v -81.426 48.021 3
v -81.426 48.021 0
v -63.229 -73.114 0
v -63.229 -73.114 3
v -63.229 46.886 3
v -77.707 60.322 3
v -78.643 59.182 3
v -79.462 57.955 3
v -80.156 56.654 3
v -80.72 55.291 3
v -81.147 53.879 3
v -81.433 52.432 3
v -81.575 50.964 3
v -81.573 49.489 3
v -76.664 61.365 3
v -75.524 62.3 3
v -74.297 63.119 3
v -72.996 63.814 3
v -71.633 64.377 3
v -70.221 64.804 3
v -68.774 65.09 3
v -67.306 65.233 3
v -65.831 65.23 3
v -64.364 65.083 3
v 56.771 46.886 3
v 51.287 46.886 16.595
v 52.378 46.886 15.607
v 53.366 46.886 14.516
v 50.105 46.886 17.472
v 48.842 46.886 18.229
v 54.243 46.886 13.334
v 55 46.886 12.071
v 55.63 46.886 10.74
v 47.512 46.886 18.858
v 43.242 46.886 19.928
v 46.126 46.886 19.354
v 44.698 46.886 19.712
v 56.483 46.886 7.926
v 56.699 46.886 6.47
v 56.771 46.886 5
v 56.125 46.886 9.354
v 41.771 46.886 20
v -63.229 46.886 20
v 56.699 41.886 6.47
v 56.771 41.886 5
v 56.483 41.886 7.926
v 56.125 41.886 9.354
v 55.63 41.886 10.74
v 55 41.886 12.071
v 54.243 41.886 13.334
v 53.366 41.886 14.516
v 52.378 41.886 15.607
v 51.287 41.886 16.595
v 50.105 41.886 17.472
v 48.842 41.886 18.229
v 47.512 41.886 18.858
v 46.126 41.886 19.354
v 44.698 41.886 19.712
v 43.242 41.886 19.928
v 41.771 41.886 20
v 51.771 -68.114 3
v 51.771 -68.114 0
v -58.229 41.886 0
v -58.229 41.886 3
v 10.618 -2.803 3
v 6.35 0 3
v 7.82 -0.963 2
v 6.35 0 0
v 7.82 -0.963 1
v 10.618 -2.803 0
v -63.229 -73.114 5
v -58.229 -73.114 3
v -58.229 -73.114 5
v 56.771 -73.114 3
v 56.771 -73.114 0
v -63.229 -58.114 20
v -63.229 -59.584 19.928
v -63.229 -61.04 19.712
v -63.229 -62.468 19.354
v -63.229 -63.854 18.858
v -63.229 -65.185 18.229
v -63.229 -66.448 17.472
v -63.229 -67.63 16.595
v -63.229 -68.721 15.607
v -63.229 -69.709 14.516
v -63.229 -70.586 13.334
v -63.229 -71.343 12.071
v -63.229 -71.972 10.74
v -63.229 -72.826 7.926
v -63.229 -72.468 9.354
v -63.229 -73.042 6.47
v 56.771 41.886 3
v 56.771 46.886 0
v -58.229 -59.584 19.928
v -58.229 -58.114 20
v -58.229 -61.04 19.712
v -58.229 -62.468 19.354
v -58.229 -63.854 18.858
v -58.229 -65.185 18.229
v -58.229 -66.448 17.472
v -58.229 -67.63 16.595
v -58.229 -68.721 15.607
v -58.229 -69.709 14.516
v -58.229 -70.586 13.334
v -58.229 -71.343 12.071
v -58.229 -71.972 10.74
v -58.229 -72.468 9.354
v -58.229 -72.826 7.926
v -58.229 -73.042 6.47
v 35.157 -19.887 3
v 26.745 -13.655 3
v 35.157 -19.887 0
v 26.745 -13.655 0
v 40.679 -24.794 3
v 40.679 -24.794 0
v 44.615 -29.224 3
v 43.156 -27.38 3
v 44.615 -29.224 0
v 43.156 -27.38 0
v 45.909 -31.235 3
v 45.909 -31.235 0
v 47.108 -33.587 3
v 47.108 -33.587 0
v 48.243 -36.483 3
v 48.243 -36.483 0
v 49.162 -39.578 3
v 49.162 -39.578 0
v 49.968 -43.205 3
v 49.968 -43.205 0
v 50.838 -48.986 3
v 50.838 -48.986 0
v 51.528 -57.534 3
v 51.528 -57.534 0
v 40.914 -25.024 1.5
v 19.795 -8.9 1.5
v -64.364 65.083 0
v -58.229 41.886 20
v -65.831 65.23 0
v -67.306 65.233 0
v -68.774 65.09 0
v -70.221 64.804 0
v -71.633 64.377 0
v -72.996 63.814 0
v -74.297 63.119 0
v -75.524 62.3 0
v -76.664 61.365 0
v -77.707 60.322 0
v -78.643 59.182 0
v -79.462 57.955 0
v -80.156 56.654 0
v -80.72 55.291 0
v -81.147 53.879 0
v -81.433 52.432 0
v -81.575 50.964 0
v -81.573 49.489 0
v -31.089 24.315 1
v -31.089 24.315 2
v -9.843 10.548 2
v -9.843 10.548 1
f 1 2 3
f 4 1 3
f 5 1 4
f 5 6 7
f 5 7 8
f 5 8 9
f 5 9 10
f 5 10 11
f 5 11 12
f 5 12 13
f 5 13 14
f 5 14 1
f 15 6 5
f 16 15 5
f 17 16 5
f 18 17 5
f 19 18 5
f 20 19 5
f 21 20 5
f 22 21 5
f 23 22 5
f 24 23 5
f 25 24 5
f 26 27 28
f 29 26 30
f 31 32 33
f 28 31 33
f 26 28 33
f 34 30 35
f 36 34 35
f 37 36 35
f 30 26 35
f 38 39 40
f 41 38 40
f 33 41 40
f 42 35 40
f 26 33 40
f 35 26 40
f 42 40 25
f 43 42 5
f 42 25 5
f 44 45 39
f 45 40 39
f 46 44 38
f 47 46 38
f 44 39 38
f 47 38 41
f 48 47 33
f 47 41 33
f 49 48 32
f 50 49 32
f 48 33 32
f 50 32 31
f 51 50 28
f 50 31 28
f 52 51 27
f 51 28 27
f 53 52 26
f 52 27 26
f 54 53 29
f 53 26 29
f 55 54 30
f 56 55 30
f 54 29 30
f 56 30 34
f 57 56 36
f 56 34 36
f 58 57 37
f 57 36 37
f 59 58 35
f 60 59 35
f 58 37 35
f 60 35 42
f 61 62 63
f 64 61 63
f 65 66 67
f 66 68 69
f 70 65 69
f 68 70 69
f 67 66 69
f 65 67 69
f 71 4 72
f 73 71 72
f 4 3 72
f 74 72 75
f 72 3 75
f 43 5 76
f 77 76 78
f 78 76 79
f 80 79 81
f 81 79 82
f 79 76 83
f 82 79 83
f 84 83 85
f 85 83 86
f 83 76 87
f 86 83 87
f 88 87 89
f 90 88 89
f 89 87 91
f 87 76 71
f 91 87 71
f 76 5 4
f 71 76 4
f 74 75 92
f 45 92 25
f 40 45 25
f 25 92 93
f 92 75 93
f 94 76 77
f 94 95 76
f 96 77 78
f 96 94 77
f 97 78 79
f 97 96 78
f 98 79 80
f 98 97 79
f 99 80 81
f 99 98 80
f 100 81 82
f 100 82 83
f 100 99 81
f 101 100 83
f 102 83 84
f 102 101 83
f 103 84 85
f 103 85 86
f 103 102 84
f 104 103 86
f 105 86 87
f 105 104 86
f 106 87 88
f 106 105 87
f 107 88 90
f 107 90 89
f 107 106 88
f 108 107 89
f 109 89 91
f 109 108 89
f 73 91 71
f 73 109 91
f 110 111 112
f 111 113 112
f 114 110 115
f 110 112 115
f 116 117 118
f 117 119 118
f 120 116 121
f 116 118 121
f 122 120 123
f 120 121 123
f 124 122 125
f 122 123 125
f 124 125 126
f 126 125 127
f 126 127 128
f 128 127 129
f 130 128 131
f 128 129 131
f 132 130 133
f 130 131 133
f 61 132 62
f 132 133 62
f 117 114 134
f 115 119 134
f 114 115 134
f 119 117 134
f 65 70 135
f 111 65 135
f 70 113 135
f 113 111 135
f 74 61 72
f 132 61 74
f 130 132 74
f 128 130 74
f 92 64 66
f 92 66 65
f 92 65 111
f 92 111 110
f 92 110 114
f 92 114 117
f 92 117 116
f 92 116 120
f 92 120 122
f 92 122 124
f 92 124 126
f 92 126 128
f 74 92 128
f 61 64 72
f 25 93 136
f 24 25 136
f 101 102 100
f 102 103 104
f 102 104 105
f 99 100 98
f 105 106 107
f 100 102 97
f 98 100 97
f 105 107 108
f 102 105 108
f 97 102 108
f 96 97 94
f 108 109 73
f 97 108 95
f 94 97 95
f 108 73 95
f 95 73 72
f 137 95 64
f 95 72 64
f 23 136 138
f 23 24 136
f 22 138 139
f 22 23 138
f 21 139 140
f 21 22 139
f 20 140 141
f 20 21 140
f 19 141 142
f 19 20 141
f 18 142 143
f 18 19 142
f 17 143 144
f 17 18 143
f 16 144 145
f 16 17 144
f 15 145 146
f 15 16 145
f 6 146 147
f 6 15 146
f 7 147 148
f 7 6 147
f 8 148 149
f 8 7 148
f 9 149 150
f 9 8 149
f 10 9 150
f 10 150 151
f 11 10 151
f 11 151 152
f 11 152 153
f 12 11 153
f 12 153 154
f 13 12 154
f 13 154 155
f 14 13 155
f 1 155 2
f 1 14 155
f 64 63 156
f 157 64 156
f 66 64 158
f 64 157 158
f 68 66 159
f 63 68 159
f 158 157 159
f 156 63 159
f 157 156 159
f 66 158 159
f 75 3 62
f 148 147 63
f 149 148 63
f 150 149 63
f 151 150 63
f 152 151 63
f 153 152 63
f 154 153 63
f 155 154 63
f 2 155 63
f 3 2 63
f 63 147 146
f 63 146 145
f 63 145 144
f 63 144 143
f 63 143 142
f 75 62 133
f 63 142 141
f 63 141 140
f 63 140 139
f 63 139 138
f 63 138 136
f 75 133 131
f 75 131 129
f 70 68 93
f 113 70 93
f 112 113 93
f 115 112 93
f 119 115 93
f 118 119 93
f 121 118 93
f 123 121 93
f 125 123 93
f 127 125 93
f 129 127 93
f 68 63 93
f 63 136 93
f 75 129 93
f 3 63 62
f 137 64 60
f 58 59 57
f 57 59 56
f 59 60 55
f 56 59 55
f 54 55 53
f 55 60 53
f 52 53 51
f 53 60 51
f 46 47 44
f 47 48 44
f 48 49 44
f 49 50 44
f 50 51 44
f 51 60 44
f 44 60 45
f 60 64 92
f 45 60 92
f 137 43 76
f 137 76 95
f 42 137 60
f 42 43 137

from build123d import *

# Parameters (mm, degrees)
F1_DEPTH = 3
F2_DEPTH = 20
F3_R     = 15


with BuildPart() as f1:
    # F0 (on Top) → F1 (new body)
    with BuildSketch(Plane.XY):
        Polygon((-84.4418774851, 68.0992258621), (-63.2286740495, 46.8860224265), (56.7713259505, 46.8860224265), align=None)
        Polygon((-63.2286740495, -73.1139775735), (-63.2286740495, 46.8860224265), (-84.4418774851, 68.0992258621), align=None)
        Polygon((-4.9964410025, -11.3462106205), (-58.2286740495, 41.8860224265), (-58.2286740495, -64.5784436676), align=None)
        with BuildLine():
            Line((48.2357920445, 41.8860224265), (-58.2286740495, 41.8860224265))
            add(Edge.make_bspline(
                [(-58.2286740495, 41.8860224265), (-27.8640476191, 22.2185579574), (-7.5944812554, 9.133690918), (6.3497696181, 0)],
                knots=[0, 0, 0, 0, 0.2321080347, 0.2321080347, 0.2321080347, 0.2321080347], degree=3))
            Line((6.3497696181, 0), (48.2357920445, 41.8860224265))
        make_face()
        Polygon((56.7713259505, 46.8860224265), (-63.2286740495, 46.8860224265), (-58.2286740495, 41.8860224265), (48.2357920445, 41.8860224265), (51.7713259505, 41.8860224265), (56.7713259505, 41.8860224265), align=None)
        Polygon((-58.2286740495, 41.8860224265), (-63.2286740495, 46.8860224265), (-63.2286740495, -73.1139775735), (-58.2286740495, -73.1139775735), (-58.2286740495, -68.1139775735), (-58.2286740495, -64.5784436676), align=None)
        Polygon((-1.4609070965, -14.8817445265), (-4.9964410025, -11.3462106205), (-58.2286740495, -64.5784436676), (-58.2286740495, -68.1139775735), (-54.6931401436, -68.1139775735), align=None)
        Polygon((51.7713259505, -68.1139775735), (-1.4609070965, -14.8817445265), (-54.6931401436, -68.1139775735), align=None)
        Polygon((-58.2286740495, -68.1139775735), (-58.2286740495, -73.1139775735), (56.7713259505, -73.1139775735), (51.7713259505, -68.1139775735), (-54.6931401436, -68.1139775735), align=None)
        Polygon((56.7713259505, -73.1139775735), (56.7713259505, 41.8860224265), (51.7713259505, 41.8860224265), (51.7713259505, 38.3504885206), (51.7713259505, -68.1139775735), align=None)
        with BuildLine():
            Line((51.7713259505, 38.3504885206), (10.6181651037, -2.8026723262))
            add(Edge.make_bspline(
                [(10.6181651037, -2.8026723262), (30.4463258159, -15.8579047438), (41.1308559966, -24.0461336089), (51.7713259505, -36.9598713142), (51.7713259505, -68.1139775735)],
                knots=[0.2569737781, 0.2569737781, 0.2569737781, 0.2569737781, 0.6213011396, 1, 1, 1, 1], degree=3))
            Line((51.7713259505, -68.1139775735), (51.7713259505, 38.3504885206))
        make_face()
        with BuildLine():
            Line((51.7713259505, 41.8860224265), (48.2357920445, 41.8860224265))
            Line((48.2357920445, 41.8860224265), (6.3497696181, 0))
            add(Edge.make_bspline(
                [(6.3497696181, 0), (7.8436177985, -0.9784926908), (9.2648713079, -1.9116383422), (10.6181651037, -2.8026723262)],
                knots=[0.2321080347, 0.2321080347, 0.2321080347, 0.2321080347, 0.2569737781, 0.2569737781, 0.2569737781, 0.2569737781], degree=3))
            Line((10.6181651037, -2.8026723262), (51.7713259505, 38.3504885206))
            Line((51.7713259505, 38.3504885206), (51.7713259505, 41.8860224265))
        make_face()
    extrude(amount=F1_DEPTH)

    # F0 (on Top) → F2 (join)
    with BuildSketch(Plane.XY):
        Polygon((56.7713259505, 46.8860224265), (-63.2286740495, 46.8860224265), (-58.2286740495, 41.8860224265), (48.2357920445, 41.8860224265), (51.7713259505, 41.8860224265), (56.7713259505, 41.8860224265), align=None)
        Polygon((-58.2286740495, 41.8860224265), (-63.2286740495, 46.8860224265), (-63.2286740495, -73.1139775735), (-58.2286740495, -73.1139775735), (-58.2286740495, -68.1139775735), (-58.2286740495, -64.5784436676), align=None)
    extrude(amount=F2_DEPTH)

    # F3
    f3_edges = [f1.edges().sort_by_distance(p)[0] for p in [
        (-60.728674, -73.113978, 20),
        (56.771326, 44.386022, 20),
        (-84.441877, 68.099226, 1.5),
    ]]
    fillet(f3_edges, radius=F3_R)


solid = f1.part
